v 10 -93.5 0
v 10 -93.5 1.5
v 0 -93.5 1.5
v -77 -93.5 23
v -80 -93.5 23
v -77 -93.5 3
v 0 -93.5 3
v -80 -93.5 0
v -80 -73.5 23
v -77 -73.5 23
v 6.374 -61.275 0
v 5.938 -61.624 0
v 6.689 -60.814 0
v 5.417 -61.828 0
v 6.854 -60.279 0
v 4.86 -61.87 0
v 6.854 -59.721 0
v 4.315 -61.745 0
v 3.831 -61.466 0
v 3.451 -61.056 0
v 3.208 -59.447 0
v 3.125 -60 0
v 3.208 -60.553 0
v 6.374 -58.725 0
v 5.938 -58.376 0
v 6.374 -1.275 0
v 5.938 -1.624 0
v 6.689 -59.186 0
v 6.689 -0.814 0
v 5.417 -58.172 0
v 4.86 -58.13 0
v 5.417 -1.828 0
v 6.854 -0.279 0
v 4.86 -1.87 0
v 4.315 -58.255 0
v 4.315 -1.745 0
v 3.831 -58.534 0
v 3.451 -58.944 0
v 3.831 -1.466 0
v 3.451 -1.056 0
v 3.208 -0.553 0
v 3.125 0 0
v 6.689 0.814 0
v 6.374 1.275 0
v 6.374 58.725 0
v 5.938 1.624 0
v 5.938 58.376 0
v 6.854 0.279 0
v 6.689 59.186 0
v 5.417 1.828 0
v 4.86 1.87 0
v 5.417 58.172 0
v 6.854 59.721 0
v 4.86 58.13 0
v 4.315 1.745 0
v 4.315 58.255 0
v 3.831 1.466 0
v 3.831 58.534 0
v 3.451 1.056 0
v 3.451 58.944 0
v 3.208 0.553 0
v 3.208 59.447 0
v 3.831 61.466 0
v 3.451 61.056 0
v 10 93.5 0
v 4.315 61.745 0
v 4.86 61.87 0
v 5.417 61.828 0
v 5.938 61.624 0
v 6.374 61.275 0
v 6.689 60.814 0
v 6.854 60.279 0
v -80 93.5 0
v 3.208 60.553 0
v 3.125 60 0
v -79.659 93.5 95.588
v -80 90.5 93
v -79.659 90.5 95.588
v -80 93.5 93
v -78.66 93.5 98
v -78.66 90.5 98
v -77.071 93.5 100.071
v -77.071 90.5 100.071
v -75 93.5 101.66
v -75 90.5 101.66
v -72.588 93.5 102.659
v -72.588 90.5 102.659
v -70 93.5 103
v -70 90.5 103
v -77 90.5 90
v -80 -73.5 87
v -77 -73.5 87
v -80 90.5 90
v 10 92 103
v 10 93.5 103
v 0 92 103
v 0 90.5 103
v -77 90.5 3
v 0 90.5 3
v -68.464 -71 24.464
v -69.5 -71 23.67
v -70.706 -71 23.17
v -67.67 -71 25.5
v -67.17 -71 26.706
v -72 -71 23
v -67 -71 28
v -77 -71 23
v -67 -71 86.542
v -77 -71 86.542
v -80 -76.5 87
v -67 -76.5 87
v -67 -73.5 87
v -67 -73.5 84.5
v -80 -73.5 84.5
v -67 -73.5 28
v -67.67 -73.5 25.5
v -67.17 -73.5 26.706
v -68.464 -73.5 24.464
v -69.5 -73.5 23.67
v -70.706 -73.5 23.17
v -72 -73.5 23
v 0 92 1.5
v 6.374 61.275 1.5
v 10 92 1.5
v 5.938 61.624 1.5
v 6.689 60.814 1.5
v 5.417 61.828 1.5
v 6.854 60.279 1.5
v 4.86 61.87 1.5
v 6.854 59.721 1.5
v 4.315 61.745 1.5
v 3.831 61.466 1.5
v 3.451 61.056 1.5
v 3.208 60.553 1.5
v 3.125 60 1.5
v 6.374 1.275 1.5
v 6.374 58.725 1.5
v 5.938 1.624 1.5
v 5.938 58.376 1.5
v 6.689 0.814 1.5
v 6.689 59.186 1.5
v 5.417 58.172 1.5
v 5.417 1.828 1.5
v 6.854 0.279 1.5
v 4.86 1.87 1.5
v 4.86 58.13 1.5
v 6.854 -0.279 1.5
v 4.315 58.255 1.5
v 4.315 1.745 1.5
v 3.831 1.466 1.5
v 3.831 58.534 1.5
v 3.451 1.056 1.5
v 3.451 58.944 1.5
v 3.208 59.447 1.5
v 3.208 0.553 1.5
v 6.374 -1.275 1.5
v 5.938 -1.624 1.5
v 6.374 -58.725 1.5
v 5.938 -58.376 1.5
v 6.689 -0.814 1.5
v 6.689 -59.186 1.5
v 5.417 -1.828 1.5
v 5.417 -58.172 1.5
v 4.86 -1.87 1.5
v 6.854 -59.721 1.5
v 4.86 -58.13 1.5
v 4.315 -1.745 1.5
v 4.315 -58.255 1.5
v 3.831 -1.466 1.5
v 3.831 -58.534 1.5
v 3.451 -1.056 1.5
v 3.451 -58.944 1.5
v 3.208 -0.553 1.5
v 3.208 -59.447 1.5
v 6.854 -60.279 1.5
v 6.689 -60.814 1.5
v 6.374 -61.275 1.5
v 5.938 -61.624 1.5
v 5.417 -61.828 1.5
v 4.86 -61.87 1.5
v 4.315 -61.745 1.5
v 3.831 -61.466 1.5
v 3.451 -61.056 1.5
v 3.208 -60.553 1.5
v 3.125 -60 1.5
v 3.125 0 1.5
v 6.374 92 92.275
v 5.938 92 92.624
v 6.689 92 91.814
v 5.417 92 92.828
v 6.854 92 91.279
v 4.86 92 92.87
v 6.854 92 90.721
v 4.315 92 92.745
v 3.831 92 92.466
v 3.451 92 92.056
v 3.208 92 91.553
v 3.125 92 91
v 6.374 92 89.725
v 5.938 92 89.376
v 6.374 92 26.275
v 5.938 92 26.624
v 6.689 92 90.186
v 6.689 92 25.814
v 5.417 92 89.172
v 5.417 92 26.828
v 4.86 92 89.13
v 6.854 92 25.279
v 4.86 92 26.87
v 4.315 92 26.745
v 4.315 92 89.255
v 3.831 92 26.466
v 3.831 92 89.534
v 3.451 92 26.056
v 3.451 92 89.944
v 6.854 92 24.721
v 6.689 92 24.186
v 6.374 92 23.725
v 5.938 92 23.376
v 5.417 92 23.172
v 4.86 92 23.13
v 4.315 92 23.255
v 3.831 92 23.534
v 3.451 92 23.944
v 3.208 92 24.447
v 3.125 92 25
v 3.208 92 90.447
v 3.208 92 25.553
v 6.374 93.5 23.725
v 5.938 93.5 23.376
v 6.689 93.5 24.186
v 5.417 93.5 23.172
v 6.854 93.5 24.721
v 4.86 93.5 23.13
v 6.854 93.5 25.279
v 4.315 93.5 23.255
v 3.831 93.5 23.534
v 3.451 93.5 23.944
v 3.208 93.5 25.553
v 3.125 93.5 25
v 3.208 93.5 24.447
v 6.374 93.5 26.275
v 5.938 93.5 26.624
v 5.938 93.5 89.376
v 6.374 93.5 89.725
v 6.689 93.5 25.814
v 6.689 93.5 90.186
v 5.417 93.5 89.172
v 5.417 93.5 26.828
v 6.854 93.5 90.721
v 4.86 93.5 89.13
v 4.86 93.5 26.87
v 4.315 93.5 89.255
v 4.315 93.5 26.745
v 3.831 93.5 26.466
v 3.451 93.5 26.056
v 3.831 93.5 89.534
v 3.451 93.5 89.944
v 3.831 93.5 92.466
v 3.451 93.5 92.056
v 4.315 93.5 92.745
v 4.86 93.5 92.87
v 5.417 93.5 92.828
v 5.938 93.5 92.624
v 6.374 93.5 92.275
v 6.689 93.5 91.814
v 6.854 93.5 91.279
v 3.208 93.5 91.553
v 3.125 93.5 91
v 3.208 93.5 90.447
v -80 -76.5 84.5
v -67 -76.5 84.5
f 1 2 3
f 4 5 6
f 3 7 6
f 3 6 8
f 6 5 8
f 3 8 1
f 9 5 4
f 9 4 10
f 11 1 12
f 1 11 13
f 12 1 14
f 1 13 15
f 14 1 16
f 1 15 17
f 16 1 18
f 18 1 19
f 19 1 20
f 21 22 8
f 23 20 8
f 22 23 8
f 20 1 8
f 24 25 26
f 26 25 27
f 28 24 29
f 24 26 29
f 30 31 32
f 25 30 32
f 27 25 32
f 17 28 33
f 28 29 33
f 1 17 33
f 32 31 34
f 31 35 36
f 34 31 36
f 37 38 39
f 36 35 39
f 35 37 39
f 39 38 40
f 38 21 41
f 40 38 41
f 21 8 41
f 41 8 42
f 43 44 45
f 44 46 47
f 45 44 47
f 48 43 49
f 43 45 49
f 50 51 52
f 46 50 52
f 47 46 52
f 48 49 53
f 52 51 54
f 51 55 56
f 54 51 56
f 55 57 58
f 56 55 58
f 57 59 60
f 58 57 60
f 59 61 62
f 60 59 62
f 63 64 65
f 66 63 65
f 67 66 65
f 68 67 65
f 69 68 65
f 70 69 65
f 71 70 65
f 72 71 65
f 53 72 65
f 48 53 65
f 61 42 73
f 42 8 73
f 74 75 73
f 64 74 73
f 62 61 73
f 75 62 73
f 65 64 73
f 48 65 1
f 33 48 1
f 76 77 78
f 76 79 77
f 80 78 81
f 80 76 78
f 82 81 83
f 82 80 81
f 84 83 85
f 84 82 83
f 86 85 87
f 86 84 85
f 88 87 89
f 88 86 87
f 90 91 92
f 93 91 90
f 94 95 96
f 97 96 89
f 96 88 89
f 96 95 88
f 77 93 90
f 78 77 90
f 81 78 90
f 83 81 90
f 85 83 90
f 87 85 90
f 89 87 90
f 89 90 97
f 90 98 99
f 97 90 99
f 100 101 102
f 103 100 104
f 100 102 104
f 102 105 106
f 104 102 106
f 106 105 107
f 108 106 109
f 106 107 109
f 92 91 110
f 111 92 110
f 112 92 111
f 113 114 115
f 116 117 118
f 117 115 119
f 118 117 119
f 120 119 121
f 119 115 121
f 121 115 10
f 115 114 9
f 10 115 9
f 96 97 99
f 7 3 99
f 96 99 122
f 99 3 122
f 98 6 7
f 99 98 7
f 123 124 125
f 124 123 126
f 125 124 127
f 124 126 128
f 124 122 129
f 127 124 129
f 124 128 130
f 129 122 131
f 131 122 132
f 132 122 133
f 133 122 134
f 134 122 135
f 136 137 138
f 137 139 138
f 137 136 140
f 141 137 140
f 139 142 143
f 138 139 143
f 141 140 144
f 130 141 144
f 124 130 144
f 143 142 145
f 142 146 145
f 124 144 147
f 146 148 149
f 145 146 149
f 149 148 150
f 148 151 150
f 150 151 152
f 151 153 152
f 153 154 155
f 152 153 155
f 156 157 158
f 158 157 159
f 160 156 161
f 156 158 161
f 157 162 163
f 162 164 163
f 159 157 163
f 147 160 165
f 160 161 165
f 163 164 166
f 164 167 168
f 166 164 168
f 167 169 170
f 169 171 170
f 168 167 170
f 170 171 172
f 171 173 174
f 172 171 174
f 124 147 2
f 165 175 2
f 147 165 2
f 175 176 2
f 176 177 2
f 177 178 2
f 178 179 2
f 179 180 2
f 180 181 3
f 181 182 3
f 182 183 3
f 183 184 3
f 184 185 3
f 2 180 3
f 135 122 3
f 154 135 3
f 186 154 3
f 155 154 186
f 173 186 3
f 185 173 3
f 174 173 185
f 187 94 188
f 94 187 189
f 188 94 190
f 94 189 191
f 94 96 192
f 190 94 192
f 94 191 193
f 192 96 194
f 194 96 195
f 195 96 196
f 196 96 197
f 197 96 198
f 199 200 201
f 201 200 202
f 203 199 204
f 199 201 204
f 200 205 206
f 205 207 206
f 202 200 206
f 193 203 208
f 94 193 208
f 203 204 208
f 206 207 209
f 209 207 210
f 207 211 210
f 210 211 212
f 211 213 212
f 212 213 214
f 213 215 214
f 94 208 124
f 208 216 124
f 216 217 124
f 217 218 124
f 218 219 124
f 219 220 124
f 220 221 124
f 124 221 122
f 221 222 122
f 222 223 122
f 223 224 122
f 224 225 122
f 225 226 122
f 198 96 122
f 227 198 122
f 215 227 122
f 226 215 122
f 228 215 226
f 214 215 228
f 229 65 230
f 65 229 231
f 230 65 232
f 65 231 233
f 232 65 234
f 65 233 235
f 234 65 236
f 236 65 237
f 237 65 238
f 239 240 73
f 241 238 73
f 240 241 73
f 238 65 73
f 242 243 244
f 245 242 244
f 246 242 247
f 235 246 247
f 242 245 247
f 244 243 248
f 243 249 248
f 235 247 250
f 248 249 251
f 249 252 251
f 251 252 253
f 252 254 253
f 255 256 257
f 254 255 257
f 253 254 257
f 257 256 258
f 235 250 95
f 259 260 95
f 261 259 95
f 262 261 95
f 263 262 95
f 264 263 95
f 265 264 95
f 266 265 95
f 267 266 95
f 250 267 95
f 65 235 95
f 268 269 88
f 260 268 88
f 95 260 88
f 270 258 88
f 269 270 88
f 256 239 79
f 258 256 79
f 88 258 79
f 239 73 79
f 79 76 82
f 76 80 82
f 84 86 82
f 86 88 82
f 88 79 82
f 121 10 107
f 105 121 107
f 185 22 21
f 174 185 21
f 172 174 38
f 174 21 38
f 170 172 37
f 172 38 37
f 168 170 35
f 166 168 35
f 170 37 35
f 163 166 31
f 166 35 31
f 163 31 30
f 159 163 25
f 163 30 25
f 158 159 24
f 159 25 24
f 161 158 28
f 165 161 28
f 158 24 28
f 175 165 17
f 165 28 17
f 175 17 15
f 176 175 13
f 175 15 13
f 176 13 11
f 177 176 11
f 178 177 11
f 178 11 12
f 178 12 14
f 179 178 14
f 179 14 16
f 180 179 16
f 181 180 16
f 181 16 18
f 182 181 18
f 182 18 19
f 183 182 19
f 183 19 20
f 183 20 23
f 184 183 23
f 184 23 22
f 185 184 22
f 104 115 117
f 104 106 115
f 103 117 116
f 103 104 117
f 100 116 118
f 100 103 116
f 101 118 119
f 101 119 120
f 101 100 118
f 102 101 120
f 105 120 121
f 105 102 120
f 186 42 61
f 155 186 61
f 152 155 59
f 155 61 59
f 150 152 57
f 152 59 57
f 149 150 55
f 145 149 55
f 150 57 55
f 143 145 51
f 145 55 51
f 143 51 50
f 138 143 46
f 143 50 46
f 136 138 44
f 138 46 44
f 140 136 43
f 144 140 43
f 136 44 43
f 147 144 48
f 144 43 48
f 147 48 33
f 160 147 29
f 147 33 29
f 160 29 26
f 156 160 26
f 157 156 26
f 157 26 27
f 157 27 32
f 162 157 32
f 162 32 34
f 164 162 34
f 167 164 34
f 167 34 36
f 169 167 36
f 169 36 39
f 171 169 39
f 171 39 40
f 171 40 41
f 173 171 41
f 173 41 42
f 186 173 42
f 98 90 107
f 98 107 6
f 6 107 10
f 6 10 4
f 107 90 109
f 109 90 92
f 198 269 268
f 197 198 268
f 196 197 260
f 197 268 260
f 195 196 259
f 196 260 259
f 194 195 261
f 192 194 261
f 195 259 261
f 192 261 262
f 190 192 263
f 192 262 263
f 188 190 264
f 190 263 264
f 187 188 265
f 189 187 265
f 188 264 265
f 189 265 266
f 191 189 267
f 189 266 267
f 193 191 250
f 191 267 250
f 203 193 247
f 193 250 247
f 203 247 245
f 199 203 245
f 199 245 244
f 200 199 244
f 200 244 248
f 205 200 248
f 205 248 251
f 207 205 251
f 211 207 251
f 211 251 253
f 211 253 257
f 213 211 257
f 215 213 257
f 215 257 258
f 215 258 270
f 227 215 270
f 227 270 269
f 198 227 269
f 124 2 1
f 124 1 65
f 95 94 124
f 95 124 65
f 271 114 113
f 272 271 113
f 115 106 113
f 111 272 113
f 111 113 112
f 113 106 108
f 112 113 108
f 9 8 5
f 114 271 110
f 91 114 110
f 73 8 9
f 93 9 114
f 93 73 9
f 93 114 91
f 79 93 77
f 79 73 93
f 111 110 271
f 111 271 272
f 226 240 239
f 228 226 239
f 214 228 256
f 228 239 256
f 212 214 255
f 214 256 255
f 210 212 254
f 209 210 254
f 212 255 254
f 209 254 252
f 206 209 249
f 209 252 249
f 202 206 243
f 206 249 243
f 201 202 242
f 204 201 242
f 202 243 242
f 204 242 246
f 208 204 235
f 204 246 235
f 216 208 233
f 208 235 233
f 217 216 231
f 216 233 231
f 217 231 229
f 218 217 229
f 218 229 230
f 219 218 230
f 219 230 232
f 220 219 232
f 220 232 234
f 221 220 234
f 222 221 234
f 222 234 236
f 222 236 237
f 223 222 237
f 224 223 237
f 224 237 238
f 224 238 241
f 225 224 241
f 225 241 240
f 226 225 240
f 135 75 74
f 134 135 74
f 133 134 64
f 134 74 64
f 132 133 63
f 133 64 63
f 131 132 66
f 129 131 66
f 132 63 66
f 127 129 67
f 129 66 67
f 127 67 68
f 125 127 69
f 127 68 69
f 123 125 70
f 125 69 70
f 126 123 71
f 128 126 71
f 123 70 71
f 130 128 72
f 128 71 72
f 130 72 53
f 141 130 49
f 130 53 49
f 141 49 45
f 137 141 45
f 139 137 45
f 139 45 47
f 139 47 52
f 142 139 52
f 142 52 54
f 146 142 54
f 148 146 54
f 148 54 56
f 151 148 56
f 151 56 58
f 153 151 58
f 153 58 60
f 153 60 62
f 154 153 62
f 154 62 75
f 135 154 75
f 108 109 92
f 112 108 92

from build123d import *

# Parameters (mm, degrees)
F0_W             = 80
F0_H             = 187
F1_DEPTH         = 3
F2_W             = 80
F2_H             = 3
F3_DEPTH         = 100
F5_DEPTH         = 3
F7_DEPTH         = 10
F8_W             = 13
F8_H             = 2.5
F9_DEPTH         = 3
F10_R            = 10
F11_R            = 5
F13_DEPTH        = 10
F16_D            = 3.75
F16_DEPTH        = 4.5
F16_TIP          = 1.1266136607
F16_ON_F15_D     = 3.75
F16_ON_F15_DEPTH = 4.5
F16_ON_F15_TIP   = 1.1266136607


with BuildPart() as f1:
    # F0 (on Top) → F1 (new body)
    with BuildSketch(Plane.XY):
        with Locations((-40, 0)):
            Rectangle(F0_W, F0_H)
    extrude(amount=F1_DEPTH)

    # F2 (on face) → F3 (join)
    with BuildSketch(Plane.XY.offset(3)):
        with Locations((-40, 92)):
            Rectangle(F2_W, F2_H)
    extrude(amount=F3_DEPTH)

    # F4 (on face) → F5 (join)
    with BuildSketch(Plane(origin=(-80, 0, 0), x_dir=(0, -1, 0), z_dir=(-1, 0, 0))):
        Polygon((-90.5, 90), (-90.5, 3), (93.5, 3), (93.5, 23), (73.5, 23), (73.5, 87), align=None)
    extrude(amount=-F5_DEPTH)

    # F6 (on face) → F7 (join)
    with BuildSketch(Plane.YZ.offset(-77)):
        Polygon((-71, 86.5415299445), (-73.5, 87), (-73.5, 23), (-71, 23), align=None)
    extrude(amount=F7_DEPTH)

    # F8 (on face) → F9 (join)
    with BuildSketch(Plane.XZ.offset(73.5)):
        with Locations((-73.5, 85.75)):
            Rectangle(F8_W, F8_H)
    extrude(amount=F9_DEPTH)

    # F10
    f10_edges = [f1.edges().sort_by_distance(p)[0] for p in [
        (-80, 92, 103),
    ]]
    fillet(f10_edges, radius=F10_R)

    # F11
    f11_edges = [f1.edges().sort_by_distance(p)[0] for p in [
        (-67, -72.25, 23),
    ]]
    fillet(f11_edges, radius=F11_R)

    # F12 (on face) → F13 (join)
    with BuildSketch(Plane.YZ):
        Polygon((93.5, 0), (93.5, 103), (92, 103), (92, 1.5), (-93.5, 1.5), (-93.5, 0), align=None)
    extrude(amount=F13_DEPTH)

    # F16
    with Locations(Plane.XY.offset(1.5)):
        with Locations((5, -60), (5, 0), (5, 60)):
            Hole(F16_D / 2, depth=F16_DEPTH)
            with Locations((0, 0, -(F16_DEPTH + F16_TIP / 2))):  # 118° drill point
                Cone(0, F16_D / 2, F16_TIP, mode=Mode.SUBTRACT)

    # F16 on F15
    with Locations(Plane.XZ.offset(-92)):
        with Locations((5, 25), (5, 91)):
            Hole(F16_ON_F15_D / 2, depth=F16_ON_F15_DEPTH)
            with Locations((0, 0, -(F16_ON_F15_DEPTH + F16_ON_F15_TIP / 2))):  # 118° drill point
                Cone(0, F16_ON_F15_D / 2, F16_ON_F15_TIP, mode=Mode.SUBTRACT)


solid = f1.part
